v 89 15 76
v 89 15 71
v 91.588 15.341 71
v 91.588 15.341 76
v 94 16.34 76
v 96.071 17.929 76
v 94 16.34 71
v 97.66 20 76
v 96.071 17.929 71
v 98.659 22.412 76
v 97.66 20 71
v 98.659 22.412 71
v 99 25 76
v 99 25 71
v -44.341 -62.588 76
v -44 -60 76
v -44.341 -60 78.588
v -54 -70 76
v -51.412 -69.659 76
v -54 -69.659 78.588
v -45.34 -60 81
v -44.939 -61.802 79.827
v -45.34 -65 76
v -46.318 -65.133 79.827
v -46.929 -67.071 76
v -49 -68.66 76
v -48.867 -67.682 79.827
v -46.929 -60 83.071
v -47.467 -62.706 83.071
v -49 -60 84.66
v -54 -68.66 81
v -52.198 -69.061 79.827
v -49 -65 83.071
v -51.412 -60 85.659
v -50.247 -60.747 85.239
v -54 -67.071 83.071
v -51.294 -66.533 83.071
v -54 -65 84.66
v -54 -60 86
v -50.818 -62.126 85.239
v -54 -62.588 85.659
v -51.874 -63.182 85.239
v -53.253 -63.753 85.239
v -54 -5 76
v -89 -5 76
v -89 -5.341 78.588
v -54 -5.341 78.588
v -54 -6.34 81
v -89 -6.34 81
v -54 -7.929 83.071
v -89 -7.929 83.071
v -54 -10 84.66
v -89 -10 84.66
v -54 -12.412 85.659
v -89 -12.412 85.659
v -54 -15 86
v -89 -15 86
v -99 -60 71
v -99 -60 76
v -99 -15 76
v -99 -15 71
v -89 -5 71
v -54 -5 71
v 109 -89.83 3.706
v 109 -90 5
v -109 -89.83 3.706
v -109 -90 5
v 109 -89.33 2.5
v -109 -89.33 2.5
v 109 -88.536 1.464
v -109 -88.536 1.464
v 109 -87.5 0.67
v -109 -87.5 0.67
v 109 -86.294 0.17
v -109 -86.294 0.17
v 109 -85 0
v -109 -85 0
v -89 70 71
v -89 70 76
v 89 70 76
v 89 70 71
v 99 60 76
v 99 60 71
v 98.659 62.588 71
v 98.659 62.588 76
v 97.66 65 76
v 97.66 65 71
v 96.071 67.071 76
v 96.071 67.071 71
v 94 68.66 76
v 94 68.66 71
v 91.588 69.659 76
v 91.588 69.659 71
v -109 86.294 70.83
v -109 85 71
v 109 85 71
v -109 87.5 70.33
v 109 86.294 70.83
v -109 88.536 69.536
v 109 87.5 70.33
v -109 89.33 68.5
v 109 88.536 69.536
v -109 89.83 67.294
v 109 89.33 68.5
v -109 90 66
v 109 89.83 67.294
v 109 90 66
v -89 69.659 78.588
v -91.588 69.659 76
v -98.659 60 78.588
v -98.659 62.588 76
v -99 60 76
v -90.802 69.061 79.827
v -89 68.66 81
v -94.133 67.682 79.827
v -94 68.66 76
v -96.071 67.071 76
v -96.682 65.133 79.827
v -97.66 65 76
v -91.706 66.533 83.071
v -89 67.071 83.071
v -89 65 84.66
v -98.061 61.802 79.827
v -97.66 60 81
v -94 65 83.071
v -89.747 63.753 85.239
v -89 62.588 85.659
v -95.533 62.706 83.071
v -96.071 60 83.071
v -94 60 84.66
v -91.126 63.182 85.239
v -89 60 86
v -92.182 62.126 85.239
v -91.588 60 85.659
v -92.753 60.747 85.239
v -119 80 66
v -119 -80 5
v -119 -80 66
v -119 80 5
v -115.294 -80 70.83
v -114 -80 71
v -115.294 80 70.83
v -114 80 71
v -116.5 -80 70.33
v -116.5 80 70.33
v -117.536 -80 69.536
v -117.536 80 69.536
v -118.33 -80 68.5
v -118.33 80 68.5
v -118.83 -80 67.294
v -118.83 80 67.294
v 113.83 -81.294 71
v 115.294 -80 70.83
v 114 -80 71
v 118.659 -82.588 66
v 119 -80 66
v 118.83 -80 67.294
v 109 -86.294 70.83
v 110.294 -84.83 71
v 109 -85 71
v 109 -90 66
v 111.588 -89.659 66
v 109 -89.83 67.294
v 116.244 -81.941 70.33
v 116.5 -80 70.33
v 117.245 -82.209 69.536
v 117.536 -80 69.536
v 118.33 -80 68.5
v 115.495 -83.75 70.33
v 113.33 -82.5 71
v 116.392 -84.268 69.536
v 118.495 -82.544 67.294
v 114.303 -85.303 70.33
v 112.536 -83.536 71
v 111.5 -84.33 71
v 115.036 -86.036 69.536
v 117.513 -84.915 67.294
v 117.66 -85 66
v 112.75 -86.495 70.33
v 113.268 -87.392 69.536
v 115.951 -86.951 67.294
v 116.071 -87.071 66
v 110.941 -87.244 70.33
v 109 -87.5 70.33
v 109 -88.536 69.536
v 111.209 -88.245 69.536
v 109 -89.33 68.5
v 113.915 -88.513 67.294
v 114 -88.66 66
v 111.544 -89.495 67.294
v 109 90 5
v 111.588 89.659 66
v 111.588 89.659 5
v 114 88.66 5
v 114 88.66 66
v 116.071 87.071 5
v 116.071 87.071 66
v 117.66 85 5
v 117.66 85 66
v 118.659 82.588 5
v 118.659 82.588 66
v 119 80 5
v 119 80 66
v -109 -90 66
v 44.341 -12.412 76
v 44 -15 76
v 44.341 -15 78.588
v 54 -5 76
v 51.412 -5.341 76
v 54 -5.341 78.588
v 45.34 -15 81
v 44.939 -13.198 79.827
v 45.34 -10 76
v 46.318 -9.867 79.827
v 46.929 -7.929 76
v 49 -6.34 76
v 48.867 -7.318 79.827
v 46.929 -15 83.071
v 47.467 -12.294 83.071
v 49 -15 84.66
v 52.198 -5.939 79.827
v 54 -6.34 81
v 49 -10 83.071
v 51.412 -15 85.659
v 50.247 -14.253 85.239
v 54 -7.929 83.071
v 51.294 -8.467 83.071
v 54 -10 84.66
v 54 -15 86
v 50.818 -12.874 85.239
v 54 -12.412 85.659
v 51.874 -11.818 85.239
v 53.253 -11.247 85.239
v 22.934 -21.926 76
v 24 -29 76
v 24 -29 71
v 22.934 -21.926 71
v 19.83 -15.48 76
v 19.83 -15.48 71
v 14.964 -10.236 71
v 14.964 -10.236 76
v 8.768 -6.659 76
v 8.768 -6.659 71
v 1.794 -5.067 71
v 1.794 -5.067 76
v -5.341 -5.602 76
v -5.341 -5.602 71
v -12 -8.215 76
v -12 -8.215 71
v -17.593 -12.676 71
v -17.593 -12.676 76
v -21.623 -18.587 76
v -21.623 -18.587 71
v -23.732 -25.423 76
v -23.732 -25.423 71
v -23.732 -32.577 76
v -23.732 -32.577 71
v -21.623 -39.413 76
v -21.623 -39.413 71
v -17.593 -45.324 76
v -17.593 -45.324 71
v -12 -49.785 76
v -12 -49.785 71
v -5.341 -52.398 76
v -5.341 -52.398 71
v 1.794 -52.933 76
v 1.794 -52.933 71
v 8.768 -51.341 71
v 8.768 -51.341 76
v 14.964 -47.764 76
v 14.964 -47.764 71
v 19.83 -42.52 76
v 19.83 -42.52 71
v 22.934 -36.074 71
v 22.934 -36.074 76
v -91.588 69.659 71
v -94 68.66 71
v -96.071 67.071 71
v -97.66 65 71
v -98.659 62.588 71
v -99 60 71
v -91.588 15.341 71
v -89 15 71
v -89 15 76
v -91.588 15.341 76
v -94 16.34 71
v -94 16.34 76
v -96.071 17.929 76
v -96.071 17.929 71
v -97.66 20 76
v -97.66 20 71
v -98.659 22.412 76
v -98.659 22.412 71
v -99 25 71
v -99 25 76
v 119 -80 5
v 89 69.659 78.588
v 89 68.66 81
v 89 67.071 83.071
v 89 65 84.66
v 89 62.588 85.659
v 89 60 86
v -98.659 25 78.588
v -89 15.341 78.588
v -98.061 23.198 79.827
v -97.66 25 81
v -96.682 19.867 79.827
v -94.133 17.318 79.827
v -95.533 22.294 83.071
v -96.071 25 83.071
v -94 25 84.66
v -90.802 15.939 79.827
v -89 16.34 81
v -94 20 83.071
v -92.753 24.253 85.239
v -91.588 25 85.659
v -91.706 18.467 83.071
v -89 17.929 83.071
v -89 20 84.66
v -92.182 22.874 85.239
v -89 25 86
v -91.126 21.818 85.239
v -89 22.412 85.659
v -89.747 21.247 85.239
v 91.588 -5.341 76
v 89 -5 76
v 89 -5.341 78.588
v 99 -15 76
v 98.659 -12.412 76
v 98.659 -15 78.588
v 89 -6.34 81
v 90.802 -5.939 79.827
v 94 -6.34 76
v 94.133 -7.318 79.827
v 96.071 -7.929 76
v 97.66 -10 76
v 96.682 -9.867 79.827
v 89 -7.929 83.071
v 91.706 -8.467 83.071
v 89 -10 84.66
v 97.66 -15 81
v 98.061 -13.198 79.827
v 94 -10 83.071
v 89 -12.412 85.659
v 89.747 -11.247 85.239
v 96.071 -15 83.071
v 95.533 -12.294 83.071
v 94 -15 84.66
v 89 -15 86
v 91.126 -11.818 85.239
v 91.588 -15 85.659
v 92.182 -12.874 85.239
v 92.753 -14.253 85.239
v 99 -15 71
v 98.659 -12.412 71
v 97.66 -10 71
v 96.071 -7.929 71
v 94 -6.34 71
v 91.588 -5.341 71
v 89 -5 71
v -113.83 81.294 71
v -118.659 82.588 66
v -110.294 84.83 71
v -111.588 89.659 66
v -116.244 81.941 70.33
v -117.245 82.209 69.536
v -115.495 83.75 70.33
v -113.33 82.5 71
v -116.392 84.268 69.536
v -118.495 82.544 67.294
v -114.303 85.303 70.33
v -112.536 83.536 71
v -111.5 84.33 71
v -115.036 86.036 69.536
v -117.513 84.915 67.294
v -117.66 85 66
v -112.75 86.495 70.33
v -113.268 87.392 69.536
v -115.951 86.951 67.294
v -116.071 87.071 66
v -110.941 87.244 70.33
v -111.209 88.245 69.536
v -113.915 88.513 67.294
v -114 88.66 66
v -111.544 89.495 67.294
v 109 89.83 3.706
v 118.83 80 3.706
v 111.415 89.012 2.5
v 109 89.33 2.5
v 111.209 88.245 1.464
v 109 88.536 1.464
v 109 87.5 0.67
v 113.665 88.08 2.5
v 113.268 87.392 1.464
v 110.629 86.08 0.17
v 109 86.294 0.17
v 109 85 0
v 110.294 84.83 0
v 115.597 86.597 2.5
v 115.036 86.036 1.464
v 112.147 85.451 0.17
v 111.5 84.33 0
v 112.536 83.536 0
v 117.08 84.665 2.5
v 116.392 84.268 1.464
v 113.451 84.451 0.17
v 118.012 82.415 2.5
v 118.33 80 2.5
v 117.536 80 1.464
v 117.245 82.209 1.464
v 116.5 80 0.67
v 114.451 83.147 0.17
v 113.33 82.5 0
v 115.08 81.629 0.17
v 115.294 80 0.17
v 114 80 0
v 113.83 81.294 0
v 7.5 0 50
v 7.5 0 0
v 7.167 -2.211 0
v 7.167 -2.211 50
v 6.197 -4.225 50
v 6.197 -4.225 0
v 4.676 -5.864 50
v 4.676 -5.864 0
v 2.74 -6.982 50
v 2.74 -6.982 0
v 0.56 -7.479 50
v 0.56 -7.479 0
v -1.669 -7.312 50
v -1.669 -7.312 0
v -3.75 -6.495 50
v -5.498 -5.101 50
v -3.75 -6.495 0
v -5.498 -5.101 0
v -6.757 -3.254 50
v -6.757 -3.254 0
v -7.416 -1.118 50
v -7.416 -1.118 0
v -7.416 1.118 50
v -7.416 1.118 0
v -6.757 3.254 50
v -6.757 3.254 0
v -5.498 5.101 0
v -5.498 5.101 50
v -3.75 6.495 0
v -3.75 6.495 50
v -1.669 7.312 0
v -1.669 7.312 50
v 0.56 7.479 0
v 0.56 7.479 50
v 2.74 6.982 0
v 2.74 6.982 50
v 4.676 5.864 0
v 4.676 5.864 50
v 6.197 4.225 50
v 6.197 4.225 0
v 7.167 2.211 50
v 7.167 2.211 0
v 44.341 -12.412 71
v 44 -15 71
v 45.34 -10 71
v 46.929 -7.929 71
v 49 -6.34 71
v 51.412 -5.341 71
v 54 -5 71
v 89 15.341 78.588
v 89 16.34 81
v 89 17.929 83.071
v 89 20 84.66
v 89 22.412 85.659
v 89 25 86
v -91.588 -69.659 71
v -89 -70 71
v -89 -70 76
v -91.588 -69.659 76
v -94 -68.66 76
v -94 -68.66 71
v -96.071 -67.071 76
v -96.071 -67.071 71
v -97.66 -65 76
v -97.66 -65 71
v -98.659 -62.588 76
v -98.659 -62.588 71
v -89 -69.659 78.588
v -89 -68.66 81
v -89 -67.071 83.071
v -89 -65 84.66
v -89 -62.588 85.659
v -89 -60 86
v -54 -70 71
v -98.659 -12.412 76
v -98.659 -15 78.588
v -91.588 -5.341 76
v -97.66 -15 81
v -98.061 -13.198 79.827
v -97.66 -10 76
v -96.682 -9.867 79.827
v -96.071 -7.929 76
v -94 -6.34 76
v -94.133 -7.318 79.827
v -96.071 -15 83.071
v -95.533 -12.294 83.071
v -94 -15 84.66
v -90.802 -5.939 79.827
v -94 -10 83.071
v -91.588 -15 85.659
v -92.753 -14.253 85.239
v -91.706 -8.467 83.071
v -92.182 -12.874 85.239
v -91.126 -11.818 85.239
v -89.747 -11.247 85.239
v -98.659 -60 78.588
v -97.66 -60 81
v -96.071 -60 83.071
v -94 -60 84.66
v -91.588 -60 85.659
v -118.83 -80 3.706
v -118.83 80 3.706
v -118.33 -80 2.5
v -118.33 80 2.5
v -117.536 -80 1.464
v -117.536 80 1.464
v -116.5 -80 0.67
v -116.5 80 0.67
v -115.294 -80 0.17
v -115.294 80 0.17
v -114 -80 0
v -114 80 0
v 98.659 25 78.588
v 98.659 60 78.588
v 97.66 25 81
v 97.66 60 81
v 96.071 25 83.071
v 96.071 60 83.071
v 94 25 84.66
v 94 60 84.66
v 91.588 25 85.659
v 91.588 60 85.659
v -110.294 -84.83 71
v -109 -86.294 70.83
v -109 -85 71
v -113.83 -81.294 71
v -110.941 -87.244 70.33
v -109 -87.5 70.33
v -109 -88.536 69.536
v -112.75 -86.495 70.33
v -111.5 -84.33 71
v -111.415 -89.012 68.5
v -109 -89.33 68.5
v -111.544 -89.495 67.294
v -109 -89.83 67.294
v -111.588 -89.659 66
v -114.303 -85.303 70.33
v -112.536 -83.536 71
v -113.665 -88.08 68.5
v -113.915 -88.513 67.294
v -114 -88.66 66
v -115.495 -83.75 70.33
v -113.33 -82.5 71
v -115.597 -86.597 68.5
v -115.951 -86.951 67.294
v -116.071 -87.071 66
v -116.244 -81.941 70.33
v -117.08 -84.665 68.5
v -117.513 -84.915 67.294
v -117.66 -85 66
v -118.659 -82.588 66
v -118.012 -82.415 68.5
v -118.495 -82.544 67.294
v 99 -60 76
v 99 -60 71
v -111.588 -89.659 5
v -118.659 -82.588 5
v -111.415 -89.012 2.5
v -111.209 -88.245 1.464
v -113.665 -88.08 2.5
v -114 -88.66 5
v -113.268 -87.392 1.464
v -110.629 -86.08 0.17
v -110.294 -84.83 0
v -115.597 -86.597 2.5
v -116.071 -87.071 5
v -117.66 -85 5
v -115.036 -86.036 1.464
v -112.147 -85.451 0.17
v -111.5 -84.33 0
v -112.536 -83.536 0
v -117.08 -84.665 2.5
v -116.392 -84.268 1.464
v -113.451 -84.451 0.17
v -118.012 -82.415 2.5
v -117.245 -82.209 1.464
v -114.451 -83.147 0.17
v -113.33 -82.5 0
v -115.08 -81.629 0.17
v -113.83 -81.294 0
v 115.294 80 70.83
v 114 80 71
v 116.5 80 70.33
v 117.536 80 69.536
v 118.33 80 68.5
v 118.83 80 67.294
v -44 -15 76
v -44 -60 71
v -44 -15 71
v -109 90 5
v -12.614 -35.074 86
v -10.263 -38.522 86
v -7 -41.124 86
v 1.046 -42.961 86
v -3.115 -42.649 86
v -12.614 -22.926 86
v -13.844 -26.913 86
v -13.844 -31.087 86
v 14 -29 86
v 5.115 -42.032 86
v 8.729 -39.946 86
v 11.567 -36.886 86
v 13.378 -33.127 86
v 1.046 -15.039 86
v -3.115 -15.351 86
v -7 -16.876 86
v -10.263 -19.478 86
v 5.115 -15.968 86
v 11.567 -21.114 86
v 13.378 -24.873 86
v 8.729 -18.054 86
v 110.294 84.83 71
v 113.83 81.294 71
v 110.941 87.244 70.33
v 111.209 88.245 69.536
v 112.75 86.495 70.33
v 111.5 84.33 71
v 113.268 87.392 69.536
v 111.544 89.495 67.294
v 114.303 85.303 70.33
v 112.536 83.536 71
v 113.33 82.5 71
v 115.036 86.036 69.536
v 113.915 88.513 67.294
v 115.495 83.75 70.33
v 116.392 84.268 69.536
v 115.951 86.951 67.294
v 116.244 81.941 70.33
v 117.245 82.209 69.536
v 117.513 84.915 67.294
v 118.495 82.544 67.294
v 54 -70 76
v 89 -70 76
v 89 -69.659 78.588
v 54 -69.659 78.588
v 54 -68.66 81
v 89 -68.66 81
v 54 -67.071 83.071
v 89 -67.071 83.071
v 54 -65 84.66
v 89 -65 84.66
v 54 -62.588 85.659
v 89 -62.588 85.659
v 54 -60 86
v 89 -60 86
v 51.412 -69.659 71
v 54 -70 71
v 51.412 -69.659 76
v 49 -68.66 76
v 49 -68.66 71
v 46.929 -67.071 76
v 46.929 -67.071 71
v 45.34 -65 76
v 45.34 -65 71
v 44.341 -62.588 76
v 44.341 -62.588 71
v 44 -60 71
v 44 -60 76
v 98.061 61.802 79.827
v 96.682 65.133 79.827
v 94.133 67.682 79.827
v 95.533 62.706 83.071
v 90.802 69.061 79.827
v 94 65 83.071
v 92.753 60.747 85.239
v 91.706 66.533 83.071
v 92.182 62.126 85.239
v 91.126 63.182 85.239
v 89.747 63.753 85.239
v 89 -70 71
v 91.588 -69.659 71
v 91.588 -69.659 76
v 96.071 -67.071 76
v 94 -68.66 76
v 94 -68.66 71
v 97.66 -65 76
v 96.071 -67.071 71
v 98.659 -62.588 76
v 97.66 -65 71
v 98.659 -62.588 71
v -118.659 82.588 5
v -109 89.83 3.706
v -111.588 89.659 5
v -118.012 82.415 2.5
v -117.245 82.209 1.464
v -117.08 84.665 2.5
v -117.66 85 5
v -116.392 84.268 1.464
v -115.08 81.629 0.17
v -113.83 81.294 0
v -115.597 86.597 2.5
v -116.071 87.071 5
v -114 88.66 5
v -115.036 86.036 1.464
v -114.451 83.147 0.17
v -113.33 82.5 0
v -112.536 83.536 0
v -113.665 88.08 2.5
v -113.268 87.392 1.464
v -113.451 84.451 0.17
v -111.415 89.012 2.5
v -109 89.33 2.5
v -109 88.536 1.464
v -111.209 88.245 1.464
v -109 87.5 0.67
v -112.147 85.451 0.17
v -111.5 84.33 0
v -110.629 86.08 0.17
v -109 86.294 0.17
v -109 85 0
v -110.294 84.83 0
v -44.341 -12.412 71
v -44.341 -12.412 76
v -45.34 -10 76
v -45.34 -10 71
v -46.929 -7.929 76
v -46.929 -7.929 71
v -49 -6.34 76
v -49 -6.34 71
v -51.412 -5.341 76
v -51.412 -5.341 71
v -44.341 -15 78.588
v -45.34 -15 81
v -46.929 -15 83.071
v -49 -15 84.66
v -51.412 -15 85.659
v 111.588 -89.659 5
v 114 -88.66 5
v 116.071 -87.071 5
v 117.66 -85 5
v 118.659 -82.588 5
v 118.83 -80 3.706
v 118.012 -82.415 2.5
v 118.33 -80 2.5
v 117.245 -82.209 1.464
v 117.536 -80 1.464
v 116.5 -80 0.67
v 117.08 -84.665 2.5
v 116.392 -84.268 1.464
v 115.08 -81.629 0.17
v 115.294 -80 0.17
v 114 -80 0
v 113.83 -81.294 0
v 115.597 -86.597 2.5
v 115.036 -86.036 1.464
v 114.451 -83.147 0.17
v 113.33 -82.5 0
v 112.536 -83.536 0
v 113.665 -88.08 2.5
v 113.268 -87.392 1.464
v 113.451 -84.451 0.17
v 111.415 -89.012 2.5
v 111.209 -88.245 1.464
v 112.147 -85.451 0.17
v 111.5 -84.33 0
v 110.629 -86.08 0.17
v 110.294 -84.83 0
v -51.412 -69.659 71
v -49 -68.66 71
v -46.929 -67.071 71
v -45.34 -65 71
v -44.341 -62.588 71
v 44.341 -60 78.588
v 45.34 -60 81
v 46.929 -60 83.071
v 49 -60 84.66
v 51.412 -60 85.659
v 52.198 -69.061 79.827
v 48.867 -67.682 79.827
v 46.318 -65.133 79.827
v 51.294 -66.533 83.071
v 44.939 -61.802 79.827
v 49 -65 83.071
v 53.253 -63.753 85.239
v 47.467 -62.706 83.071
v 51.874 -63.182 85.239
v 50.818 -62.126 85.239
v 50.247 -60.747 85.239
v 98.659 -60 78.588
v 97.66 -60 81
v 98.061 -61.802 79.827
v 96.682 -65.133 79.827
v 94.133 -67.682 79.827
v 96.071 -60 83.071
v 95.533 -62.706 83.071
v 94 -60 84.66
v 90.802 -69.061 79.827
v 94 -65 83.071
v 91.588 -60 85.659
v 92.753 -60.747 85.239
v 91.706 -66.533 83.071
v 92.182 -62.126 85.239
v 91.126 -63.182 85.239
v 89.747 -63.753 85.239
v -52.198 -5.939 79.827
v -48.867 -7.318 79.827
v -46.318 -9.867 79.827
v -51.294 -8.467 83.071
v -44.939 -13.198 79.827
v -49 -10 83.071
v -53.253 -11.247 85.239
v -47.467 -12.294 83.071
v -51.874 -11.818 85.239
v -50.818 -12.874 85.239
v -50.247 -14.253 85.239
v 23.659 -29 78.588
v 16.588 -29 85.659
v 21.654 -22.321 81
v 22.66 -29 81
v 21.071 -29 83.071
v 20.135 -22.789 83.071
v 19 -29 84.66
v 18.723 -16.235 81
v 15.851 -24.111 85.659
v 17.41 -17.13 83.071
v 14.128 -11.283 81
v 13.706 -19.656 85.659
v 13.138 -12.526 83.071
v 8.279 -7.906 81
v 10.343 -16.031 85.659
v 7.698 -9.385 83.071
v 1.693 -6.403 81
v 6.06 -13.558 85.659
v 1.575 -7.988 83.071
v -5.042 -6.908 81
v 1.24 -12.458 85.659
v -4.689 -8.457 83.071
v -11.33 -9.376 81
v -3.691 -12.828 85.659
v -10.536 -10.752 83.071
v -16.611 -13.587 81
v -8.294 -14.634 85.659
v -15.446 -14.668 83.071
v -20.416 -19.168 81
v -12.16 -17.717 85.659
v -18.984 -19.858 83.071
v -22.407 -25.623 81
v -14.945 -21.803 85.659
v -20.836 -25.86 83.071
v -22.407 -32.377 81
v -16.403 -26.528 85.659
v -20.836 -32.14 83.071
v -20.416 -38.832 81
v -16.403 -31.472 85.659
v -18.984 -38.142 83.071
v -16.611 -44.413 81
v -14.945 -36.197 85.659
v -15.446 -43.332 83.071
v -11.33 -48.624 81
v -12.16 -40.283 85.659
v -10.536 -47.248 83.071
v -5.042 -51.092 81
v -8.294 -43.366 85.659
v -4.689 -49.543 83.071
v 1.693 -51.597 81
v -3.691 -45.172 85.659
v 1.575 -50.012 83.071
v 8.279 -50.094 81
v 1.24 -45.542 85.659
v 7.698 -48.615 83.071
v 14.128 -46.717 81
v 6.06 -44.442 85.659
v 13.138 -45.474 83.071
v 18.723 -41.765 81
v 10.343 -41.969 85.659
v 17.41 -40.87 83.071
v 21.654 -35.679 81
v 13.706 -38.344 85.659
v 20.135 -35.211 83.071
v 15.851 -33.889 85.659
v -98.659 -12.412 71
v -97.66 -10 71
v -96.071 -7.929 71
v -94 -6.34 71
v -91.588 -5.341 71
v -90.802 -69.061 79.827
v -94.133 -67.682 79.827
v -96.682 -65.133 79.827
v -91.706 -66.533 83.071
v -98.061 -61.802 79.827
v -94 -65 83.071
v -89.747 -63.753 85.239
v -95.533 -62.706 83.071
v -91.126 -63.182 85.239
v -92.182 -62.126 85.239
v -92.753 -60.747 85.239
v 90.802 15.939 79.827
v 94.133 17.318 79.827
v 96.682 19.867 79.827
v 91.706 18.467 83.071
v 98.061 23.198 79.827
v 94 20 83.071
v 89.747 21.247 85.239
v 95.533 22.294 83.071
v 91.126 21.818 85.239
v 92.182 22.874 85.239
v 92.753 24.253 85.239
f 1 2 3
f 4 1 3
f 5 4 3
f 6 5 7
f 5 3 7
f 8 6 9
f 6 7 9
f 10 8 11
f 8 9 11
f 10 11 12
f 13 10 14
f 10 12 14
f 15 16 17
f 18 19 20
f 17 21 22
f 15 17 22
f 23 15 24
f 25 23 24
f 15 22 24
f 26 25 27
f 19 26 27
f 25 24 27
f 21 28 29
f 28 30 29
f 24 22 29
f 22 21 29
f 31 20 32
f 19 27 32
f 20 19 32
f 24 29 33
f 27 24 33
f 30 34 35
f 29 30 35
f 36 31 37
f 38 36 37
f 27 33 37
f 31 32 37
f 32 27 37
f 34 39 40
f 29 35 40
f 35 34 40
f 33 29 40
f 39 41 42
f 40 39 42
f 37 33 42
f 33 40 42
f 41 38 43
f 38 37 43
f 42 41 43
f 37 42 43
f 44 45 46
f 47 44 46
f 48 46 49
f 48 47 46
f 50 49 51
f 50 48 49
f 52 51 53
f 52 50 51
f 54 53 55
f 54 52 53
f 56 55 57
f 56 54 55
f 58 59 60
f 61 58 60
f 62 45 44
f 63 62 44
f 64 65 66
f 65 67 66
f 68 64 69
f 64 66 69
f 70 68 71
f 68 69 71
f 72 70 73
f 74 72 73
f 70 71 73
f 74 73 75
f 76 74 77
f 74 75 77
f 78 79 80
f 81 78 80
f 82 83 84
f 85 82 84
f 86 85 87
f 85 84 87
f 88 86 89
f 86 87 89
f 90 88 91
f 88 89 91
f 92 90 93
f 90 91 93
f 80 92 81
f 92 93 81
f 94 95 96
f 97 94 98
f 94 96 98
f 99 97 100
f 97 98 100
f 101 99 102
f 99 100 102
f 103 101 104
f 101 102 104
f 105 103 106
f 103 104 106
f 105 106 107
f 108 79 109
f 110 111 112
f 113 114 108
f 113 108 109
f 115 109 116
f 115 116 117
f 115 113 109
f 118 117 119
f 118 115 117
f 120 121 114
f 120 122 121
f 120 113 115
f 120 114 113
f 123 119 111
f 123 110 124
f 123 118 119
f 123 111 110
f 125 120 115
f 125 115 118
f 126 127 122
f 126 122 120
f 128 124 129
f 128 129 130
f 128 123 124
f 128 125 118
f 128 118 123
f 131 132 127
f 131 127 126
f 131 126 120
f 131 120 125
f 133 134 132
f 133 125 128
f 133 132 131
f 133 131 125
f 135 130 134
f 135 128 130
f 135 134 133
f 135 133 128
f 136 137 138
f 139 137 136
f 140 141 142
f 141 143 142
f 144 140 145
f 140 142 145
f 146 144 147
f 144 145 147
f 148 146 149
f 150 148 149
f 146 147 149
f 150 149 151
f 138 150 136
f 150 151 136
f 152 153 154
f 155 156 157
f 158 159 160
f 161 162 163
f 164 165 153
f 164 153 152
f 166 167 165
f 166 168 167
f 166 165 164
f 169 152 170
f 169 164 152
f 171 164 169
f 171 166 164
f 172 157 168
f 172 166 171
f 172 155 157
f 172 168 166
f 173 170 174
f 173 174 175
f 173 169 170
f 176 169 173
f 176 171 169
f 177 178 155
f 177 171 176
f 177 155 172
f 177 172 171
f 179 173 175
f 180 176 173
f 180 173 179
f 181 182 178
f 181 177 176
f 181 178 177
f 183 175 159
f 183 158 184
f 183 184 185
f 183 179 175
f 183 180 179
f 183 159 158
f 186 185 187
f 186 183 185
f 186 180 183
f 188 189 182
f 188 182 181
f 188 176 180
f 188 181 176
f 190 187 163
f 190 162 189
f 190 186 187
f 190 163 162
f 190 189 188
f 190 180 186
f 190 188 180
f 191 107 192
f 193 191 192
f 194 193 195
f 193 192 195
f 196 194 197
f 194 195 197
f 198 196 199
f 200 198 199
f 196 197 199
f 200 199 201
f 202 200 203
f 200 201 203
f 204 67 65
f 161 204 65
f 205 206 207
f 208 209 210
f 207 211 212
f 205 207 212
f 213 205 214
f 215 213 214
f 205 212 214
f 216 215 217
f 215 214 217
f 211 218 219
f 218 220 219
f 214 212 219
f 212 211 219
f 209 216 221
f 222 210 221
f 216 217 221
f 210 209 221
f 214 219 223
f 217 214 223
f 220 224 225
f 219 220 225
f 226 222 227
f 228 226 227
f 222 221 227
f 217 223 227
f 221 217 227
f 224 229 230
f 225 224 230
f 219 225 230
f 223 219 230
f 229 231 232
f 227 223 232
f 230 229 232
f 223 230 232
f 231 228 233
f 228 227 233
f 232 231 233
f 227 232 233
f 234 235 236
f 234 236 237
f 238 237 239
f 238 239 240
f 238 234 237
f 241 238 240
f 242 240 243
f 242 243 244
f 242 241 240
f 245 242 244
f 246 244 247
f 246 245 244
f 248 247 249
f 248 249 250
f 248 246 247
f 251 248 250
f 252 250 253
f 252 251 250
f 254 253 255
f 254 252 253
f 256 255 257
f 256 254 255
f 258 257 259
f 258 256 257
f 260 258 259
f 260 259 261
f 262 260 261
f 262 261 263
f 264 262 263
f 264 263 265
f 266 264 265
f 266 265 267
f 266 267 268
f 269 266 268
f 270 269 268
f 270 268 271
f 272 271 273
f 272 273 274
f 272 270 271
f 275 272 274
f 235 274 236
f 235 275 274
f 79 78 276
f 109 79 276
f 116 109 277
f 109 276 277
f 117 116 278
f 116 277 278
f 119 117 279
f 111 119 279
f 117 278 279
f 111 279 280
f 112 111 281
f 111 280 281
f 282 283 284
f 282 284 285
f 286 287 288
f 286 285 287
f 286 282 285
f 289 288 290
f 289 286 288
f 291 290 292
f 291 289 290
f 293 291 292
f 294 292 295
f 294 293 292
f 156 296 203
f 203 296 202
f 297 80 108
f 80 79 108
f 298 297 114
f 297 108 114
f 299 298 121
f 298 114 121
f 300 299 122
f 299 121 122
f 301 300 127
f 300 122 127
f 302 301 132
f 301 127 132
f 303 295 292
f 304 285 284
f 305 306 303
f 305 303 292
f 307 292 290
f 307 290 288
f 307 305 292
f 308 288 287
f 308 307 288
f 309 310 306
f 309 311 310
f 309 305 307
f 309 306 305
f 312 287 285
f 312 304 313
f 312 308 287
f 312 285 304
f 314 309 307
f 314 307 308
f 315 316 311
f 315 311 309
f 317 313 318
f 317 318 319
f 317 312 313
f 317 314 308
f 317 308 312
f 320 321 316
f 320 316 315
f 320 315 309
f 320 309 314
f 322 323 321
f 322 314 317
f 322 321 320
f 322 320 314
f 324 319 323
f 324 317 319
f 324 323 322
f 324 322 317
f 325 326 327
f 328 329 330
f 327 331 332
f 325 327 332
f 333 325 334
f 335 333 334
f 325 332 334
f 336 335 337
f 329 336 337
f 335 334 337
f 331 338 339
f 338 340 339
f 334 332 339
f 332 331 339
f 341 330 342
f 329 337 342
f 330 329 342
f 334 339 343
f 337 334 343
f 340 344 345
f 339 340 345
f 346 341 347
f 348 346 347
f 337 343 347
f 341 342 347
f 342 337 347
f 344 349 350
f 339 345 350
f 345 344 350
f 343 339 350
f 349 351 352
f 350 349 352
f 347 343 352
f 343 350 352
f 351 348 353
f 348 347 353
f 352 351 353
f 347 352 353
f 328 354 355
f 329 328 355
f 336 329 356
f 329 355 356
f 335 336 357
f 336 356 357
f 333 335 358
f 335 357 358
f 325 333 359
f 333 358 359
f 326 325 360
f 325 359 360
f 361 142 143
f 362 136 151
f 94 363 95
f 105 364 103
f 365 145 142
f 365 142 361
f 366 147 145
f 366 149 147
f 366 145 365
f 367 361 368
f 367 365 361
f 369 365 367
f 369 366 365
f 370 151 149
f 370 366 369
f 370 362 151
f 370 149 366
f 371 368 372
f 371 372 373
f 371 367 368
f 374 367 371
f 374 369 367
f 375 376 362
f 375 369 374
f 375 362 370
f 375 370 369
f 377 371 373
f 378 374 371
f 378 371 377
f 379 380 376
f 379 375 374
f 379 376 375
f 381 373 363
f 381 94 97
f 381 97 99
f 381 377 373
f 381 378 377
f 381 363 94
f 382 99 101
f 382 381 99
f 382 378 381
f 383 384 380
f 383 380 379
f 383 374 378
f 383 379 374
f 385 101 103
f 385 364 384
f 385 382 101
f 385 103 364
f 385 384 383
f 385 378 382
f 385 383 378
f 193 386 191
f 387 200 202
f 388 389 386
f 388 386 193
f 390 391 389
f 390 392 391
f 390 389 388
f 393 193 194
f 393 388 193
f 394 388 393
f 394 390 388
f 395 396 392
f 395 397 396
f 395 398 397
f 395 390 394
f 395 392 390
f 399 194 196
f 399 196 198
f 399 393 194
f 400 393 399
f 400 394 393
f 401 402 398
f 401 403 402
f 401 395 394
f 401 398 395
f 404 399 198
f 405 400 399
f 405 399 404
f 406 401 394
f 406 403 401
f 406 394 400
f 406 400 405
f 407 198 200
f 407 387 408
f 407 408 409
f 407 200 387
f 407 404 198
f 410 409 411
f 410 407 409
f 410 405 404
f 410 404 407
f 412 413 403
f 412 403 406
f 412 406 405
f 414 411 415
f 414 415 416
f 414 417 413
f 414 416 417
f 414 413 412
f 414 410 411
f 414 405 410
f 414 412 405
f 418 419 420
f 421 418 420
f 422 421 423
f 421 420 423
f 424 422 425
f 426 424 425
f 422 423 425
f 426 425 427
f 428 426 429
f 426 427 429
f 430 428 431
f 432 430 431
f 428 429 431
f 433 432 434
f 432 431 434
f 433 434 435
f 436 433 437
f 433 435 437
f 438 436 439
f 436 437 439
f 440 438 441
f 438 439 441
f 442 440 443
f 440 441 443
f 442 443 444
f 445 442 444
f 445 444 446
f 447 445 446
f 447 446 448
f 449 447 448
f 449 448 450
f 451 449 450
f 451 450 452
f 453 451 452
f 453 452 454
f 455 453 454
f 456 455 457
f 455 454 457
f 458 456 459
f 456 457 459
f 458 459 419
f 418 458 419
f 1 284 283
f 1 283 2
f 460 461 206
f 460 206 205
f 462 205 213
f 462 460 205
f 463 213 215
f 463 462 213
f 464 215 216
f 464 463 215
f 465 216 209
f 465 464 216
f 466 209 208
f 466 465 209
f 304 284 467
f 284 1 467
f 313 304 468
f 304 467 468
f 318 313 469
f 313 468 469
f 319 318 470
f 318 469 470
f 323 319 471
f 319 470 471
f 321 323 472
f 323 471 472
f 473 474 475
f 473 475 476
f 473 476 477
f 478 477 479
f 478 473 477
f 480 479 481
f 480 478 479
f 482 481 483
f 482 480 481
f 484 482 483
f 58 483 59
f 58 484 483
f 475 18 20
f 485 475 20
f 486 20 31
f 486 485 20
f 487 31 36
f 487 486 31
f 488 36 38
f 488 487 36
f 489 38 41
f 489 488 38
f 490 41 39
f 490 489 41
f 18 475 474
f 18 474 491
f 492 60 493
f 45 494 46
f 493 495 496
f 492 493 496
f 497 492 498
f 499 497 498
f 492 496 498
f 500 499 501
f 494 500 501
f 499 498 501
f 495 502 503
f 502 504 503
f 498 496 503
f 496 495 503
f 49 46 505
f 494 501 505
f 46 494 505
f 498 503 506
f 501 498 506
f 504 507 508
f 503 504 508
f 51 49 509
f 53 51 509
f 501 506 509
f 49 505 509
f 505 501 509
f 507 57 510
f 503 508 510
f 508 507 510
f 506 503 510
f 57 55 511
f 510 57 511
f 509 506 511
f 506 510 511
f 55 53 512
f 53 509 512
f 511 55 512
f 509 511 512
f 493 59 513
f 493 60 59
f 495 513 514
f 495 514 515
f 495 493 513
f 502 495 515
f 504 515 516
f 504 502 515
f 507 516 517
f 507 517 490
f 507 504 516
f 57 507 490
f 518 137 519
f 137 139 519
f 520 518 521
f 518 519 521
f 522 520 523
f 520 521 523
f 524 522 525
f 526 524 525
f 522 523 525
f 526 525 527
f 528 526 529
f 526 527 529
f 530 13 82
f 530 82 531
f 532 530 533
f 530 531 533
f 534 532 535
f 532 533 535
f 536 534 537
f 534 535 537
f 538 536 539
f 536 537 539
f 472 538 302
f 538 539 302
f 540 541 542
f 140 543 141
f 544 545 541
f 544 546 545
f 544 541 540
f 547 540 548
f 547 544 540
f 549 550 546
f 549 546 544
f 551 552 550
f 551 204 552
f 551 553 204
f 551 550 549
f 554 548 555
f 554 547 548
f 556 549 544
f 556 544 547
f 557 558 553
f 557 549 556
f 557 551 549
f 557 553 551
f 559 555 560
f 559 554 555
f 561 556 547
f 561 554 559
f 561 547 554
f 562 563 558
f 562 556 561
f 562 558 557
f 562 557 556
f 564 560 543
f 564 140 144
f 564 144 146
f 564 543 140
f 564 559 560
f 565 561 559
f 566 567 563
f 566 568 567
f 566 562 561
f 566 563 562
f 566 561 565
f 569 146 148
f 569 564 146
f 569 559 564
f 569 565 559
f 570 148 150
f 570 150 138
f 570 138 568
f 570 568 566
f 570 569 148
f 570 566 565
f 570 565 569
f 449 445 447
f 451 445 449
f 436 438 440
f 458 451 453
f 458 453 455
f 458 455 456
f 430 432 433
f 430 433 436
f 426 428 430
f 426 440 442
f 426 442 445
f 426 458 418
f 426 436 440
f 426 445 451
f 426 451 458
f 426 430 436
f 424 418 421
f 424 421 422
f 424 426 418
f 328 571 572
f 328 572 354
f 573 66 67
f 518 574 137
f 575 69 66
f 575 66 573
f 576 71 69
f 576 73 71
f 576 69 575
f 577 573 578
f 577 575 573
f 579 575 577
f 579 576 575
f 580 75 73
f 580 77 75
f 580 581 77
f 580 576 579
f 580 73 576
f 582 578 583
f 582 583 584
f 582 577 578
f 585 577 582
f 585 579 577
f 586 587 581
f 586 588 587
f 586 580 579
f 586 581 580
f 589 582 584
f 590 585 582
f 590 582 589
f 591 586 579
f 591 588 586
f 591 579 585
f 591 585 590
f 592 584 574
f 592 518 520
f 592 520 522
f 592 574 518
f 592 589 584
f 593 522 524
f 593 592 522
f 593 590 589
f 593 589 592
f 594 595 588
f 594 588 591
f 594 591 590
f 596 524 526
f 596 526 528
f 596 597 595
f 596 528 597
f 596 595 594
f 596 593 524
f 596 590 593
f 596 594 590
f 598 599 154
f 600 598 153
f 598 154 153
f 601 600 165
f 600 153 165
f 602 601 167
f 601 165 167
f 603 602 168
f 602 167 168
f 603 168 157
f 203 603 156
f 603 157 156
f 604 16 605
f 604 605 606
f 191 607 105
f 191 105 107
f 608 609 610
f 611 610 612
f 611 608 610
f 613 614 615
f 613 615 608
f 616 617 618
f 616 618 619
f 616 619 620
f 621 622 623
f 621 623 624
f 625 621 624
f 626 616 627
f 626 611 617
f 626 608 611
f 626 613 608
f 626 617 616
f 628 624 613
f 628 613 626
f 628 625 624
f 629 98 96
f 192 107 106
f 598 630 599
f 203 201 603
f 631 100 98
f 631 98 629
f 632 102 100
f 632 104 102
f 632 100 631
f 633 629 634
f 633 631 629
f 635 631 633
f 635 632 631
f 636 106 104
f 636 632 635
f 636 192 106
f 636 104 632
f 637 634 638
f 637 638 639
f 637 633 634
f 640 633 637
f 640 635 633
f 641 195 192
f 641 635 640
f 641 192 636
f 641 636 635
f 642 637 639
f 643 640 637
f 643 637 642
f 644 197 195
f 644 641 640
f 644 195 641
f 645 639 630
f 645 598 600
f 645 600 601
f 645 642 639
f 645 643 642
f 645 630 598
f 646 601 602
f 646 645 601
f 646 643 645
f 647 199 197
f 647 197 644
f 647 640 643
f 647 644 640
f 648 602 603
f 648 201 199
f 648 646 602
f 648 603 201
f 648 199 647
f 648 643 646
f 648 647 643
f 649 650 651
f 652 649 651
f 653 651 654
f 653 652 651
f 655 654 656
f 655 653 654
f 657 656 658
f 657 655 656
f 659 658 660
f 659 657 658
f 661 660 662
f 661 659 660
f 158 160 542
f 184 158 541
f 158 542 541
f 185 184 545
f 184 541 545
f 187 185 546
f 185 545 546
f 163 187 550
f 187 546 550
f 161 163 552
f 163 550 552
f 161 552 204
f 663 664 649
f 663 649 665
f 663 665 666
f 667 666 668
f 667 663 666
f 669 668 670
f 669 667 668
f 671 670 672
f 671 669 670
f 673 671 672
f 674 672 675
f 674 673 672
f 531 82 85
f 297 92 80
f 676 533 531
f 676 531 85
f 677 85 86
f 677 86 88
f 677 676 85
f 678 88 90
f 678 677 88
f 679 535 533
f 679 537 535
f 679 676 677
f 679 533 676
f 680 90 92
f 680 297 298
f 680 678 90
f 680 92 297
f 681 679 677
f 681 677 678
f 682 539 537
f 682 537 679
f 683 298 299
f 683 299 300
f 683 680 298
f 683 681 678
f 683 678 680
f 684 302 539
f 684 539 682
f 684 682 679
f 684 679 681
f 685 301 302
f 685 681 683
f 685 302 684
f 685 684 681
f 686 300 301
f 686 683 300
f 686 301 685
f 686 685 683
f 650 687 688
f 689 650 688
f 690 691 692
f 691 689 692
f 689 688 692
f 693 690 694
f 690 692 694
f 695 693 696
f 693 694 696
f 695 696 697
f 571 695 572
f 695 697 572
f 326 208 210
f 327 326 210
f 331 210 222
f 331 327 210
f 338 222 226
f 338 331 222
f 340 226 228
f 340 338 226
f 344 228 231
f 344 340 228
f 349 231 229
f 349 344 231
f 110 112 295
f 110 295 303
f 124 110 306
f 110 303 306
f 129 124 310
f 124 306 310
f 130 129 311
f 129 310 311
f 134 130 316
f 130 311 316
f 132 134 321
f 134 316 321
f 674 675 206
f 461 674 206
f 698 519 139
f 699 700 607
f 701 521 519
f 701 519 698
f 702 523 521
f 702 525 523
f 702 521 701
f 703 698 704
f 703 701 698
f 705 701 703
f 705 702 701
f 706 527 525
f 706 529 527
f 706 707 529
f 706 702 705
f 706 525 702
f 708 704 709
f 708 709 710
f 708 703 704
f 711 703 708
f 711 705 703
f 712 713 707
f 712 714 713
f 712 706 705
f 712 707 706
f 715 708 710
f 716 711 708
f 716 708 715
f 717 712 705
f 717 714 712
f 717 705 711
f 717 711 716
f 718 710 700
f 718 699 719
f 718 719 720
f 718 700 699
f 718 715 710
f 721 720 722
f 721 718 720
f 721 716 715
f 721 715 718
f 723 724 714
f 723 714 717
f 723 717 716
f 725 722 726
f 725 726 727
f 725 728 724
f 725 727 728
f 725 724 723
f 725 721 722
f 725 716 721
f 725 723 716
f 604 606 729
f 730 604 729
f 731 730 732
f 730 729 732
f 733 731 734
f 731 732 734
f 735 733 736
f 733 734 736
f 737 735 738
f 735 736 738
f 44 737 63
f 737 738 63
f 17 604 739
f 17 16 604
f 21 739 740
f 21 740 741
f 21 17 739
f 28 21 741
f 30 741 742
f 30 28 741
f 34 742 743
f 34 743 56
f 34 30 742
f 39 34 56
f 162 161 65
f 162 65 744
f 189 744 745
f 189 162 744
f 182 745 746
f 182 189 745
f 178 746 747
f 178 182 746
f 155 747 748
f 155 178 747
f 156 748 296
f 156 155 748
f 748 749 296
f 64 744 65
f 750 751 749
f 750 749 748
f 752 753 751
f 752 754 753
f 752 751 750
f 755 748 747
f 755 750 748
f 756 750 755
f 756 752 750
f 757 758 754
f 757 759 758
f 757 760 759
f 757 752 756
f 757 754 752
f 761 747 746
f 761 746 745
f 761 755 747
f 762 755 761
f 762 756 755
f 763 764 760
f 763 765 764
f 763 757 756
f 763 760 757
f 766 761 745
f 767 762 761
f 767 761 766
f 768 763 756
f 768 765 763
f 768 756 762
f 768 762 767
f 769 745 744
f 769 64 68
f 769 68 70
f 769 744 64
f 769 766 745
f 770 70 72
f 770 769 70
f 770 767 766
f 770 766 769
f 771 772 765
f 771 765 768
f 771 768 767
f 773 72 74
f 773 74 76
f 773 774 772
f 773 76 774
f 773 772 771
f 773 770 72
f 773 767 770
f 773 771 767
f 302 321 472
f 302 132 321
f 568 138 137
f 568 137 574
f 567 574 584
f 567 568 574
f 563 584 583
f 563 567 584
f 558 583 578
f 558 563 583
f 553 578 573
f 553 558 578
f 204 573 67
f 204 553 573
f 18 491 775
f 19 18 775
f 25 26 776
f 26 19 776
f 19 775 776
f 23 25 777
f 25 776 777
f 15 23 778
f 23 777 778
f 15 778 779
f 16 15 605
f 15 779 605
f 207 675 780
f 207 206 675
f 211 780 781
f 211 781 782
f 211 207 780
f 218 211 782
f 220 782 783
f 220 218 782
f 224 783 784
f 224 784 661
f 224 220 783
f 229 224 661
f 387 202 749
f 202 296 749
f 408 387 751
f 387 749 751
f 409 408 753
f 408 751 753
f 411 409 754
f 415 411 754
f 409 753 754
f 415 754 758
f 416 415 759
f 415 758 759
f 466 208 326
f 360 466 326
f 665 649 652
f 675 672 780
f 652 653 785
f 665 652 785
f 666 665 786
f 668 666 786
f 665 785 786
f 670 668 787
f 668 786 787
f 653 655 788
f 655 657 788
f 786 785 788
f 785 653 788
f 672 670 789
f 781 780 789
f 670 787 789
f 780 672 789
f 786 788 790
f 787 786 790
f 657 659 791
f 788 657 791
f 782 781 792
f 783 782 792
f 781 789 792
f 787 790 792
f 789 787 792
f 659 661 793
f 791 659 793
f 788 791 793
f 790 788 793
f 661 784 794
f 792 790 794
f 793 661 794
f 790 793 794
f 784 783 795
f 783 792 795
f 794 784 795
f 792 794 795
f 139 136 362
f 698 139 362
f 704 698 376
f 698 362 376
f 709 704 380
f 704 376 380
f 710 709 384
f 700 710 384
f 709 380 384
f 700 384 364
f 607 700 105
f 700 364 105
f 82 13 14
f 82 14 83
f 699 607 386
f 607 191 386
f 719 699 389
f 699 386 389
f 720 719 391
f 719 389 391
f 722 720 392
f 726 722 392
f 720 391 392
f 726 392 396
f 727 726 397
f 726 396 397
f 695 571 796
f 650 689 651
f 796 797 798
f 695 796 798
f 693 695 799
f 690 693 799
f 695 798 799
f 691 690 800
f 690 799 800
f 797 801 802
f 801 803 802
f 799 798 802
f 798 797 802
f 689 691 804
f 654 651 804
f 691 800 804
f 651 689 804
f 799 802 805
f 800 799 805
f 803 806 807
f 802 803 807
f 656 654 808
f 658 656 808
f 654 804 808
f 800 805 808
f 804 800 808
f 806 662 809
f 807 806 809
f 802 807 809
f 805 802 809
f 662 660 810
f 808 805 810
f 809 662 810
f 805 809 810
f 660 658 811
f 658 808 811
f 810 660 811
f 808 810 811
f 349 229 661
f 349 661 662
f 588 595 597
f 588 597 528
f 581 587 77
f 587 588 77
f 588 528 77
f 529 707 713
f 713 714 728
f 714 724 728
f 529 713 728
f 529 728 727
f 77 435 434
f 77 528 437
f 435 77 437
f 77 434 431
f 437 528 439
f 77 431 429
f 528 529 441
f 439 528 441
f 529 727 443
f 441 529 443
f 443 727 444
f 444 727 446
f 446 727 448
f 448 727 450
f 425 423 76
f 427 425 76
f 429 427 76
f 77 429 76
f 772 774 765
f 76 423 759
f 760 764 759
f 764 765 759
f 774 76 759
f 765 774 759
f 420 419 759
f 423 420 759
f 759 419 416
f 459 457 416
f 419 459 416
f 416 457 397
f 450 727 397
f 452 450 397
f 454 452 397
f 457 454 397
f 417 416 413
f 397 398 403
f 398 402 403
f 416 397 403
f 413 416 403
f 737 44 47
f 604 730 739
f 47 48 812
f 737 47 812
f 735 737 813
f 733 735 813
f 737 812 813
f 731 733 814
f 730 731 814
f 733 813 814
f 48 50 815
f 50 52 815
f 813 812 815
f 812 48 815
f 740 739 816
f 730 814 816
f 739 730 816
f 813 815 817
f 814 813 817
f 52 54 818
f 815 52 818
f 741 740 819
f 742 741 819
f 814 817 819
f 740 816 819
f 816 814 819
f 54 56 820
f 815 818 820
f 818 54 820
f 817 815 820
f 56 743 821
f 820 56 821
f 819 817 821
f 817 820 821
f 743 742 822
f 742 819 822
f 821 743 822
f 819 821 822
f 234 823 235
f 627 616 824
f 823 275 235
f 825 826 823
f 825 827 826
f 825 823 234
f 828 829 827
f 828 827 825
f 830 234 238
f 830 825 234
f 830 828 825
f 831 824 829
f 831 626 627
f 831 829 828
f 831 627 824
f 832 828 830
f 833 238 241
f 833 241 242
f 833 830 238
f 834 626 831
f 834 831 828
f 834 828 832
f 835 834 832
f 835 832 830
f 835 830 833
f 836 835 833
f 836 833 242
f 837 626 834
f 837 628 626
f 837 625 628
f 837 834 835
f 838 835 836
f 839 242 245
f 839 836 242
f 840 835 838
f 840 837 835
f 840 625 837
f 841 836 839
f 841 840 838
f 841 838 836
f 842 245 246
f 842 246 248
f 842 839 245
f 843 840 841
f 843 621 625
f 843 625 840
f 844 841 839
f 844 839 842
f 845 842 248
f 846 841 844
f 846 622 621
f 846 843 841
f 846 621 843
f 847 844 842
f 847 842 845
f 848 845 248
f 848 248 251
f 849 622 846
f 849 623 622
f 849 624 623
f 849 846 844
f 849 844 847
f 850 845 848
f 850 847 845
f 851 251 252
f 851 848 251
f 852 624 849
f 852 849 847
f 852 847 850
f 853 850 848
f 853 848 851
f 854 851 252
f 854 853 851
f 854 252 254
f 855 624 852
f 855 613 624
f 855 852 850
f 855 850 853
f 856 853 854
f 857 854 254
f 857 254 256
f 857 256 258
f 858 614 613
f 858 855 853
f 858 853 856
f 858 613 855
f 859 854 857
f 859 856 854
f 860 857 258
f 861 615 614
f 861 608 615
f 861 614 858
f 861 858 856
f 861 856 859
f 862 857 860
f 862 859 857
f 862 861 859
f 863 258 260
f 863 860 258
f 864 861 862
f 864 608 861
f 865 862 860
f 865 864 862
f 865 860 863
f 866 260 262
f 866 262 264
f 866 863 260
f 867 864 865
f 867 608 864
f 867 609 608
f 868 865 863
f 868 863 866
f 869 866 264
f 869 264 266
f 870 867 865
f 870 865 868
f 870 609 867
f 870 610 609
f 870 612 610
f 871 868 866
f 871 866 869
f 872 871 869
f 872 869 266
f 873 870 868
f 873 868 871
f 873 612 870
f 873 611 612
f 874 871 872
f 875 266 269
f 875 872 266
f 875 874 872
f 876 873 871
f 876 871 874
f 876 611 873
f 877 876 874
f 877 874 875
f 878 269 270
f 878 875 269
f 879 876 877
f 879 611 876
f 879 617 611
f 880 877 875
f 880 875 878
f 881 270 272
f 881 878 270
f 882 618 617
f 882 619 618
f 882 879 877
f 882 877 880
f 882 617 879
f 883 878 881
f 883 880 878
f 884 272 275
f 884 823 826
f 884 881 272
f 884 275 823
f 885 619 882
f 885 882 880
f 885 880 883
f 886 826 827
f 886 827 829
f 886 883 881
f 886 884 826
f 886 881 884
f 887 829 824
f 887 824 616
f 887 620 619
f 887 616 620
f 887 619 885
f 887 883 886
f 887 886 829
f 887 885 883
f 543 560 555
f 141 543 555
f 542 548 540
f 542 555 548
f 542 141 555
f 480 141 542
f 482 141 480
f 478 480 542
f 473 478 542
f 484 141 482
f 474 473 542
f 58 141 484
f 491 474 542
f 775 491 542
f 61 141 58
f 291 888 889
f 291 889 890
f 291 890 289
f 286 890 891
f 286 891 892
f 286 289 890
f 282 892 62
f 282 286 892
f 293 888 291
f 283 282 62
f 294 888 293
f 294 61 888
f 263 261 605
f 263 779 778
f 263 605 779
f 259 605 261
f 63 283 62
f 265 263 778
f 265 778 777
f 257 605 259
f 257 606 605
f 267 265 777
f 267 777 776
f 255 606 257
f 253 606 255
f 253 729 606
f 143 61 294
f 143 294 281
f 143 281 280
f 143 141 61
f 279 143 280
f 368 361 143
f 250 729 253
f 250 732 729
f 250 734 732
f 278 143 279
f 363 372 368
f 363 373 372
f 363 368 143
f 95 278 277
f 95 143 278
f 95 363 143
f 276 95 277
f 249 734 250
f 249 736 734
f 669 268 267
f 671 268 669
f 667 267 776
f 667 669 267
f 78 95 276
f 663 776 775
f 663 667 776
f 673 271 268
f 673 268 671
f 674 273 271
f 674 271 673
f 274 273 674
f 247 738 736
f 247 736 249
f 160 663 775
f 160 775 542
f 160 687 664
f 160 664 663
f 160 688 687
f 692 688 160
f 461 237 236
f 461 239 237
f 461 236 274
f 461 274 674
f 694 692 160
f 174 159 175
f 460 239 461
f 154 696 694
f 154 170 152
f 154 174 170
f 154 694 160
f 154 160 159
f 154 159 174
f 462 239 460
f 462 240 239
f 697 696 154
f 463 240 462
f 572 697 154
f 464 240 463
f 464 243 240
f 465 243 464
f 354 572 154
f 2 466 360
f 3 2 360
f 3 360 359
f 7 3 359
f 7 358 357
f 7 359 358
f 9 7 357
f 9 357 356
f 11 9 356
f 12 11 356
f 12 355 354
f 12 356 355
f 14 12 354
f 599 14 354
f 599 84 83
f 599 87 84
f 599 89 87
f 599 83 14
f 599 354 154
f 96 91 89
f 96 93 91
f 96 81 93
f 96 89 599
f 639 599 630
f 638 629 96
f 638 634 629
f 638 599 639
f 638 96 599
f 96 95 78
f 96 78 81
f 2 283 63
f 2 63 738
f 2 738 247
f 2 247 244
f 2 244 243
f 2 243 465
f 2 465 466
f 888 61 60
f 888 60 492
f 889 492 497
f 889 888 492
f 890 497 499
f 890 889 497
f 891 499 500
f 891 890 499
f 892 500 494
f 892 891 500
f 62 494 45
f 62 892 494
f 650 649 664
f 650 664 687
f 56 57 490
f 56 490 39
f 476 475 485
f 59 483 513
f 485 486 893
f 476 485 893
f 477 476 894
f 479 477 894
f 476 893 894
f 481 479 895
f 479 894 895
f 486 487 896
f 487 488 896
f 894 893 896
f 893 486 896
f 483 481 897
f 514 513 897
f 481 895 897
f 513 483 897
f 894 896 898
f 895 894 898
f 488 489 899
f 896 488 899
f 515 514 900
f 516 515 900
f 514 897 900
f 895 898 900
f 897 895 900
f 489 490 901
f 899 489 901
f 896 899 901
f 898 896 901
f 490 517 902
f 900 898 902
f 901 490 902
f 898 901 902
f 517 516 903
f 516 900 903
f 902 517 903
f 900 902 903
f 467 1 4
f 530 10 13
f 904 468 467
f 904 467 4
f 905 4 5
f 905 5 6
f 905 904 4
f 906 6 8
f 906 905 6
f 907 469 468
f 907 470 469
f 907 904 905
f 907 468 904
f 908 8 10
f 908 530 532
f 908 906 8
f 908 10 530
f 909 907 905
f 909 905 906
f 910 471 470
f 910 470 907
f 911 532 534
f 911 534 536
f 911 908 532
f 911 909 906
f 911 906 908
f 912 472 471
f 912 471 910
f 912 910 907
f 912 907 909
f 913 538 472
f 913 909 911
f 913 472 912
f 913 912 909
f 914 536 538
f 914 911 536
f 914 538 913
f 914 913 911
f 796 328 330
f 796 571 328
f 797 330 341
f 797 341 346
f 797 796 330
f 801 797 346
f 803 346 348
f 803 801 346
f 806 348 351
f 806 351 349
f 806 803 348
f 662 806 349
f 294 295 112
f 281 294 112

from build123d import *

# Parameters (mm, degrees)
F0_W     = 238
F0_H     = 180
F1_DEPTH = 86
F2_W     = 238
F2_H     = 180
F2_W_2   = 55
F2_H_2   = 65
F2_R     = 24
F2_W_3   = 198
F2_H_3   = 55
F3_DEPTH = 15
F4_R     = 10
F5_R     = 10
F6_R     = 5
F7_R     = 7.5
F8_DEPTH = 50


with BuildPart() as f1:
    # F0 (on Top) → F1 (new body)
    with BuildSketch(Plane.XY):
        Rectangle(F0_W, F0_H)
    extrude(amount=F1_DEPTH)

    # F2 (on face) → F3 (cut)
    with BuildSketch(Plane.XY.offset(86)):
        Rectangle(F2_W, F2_H)
        with Locations((-71.5, -37.5)):
            Rectangle(F2_W_2, F2_H_2, mode=Mode.SUBTRACT)
        with Locations((0, -29)):
            Circle(F2_R, mode=Mode.SUBTRACT)
        with Locations((71.5, -37.5)):
            Rectangle(F2_W_2, F2_H_2, mode=Mode.SUBTRACT)
        with Locations((0, 42.5)):
            Rectangle(F2_W_3, F2_H_3, mode=Mode.SUBTRACT)
    extrude(amount=-F3_DEPTH, mode=Mode.SUBTRACT)

    # F4
    f4_edges = [f1.edges().sort_by_distance(p)[0] for p in [
        (-119, -90, 35.5),
        (119, -90, 35.5),
        (-119, 90, 35.5),
        (119, 90, 35.5),
        (-99, 70, 78.5),
        (-99, -5, 78.5),
        (-99, -70, 78.5),
        (-44, -5, 78.5),
        (99, 70, 78.5),
        (99, -5, 78.5),
        (44, -5, 78.5),
        (44, -70, 78.5),
        (-99, 15, 78.5),
        (-44, -70, 78.5),
        (99, -70, 78.5),
        (99, 15, 78.5),
    ]]
    fillet(f4_edges, radius=F4_R)

    # F5
    f5_edges = [f1.edges().sort_by_distance(p)[0] for p in [
        (0, 15, 86),
        (-71.5, -5, 86),
        (-24, -29, 86),
        (71.5, -5, 86),
    ]]
    fillet(f5_edges, radius=F5_R)

    # F6
    f6_edges = [f1.edges().sort_by_distance(p)[0] for p in [
        (-119, 0, 71),
        (-119, 0, 0),
    ]]
    fillet(f6_edges, radius=F6_R)

    # F7 (on face) → F8 (cut)
    with BuildSketch(Plane(origin=(0, 0, 0), x_dir=(1, 0, 0), z_dir=(0, 0, -1))):
        Circle(F7_R)
    extrude(amount=-F8_DEPTH, mode=Mode.SUBTRACT)


solid = f1.part
